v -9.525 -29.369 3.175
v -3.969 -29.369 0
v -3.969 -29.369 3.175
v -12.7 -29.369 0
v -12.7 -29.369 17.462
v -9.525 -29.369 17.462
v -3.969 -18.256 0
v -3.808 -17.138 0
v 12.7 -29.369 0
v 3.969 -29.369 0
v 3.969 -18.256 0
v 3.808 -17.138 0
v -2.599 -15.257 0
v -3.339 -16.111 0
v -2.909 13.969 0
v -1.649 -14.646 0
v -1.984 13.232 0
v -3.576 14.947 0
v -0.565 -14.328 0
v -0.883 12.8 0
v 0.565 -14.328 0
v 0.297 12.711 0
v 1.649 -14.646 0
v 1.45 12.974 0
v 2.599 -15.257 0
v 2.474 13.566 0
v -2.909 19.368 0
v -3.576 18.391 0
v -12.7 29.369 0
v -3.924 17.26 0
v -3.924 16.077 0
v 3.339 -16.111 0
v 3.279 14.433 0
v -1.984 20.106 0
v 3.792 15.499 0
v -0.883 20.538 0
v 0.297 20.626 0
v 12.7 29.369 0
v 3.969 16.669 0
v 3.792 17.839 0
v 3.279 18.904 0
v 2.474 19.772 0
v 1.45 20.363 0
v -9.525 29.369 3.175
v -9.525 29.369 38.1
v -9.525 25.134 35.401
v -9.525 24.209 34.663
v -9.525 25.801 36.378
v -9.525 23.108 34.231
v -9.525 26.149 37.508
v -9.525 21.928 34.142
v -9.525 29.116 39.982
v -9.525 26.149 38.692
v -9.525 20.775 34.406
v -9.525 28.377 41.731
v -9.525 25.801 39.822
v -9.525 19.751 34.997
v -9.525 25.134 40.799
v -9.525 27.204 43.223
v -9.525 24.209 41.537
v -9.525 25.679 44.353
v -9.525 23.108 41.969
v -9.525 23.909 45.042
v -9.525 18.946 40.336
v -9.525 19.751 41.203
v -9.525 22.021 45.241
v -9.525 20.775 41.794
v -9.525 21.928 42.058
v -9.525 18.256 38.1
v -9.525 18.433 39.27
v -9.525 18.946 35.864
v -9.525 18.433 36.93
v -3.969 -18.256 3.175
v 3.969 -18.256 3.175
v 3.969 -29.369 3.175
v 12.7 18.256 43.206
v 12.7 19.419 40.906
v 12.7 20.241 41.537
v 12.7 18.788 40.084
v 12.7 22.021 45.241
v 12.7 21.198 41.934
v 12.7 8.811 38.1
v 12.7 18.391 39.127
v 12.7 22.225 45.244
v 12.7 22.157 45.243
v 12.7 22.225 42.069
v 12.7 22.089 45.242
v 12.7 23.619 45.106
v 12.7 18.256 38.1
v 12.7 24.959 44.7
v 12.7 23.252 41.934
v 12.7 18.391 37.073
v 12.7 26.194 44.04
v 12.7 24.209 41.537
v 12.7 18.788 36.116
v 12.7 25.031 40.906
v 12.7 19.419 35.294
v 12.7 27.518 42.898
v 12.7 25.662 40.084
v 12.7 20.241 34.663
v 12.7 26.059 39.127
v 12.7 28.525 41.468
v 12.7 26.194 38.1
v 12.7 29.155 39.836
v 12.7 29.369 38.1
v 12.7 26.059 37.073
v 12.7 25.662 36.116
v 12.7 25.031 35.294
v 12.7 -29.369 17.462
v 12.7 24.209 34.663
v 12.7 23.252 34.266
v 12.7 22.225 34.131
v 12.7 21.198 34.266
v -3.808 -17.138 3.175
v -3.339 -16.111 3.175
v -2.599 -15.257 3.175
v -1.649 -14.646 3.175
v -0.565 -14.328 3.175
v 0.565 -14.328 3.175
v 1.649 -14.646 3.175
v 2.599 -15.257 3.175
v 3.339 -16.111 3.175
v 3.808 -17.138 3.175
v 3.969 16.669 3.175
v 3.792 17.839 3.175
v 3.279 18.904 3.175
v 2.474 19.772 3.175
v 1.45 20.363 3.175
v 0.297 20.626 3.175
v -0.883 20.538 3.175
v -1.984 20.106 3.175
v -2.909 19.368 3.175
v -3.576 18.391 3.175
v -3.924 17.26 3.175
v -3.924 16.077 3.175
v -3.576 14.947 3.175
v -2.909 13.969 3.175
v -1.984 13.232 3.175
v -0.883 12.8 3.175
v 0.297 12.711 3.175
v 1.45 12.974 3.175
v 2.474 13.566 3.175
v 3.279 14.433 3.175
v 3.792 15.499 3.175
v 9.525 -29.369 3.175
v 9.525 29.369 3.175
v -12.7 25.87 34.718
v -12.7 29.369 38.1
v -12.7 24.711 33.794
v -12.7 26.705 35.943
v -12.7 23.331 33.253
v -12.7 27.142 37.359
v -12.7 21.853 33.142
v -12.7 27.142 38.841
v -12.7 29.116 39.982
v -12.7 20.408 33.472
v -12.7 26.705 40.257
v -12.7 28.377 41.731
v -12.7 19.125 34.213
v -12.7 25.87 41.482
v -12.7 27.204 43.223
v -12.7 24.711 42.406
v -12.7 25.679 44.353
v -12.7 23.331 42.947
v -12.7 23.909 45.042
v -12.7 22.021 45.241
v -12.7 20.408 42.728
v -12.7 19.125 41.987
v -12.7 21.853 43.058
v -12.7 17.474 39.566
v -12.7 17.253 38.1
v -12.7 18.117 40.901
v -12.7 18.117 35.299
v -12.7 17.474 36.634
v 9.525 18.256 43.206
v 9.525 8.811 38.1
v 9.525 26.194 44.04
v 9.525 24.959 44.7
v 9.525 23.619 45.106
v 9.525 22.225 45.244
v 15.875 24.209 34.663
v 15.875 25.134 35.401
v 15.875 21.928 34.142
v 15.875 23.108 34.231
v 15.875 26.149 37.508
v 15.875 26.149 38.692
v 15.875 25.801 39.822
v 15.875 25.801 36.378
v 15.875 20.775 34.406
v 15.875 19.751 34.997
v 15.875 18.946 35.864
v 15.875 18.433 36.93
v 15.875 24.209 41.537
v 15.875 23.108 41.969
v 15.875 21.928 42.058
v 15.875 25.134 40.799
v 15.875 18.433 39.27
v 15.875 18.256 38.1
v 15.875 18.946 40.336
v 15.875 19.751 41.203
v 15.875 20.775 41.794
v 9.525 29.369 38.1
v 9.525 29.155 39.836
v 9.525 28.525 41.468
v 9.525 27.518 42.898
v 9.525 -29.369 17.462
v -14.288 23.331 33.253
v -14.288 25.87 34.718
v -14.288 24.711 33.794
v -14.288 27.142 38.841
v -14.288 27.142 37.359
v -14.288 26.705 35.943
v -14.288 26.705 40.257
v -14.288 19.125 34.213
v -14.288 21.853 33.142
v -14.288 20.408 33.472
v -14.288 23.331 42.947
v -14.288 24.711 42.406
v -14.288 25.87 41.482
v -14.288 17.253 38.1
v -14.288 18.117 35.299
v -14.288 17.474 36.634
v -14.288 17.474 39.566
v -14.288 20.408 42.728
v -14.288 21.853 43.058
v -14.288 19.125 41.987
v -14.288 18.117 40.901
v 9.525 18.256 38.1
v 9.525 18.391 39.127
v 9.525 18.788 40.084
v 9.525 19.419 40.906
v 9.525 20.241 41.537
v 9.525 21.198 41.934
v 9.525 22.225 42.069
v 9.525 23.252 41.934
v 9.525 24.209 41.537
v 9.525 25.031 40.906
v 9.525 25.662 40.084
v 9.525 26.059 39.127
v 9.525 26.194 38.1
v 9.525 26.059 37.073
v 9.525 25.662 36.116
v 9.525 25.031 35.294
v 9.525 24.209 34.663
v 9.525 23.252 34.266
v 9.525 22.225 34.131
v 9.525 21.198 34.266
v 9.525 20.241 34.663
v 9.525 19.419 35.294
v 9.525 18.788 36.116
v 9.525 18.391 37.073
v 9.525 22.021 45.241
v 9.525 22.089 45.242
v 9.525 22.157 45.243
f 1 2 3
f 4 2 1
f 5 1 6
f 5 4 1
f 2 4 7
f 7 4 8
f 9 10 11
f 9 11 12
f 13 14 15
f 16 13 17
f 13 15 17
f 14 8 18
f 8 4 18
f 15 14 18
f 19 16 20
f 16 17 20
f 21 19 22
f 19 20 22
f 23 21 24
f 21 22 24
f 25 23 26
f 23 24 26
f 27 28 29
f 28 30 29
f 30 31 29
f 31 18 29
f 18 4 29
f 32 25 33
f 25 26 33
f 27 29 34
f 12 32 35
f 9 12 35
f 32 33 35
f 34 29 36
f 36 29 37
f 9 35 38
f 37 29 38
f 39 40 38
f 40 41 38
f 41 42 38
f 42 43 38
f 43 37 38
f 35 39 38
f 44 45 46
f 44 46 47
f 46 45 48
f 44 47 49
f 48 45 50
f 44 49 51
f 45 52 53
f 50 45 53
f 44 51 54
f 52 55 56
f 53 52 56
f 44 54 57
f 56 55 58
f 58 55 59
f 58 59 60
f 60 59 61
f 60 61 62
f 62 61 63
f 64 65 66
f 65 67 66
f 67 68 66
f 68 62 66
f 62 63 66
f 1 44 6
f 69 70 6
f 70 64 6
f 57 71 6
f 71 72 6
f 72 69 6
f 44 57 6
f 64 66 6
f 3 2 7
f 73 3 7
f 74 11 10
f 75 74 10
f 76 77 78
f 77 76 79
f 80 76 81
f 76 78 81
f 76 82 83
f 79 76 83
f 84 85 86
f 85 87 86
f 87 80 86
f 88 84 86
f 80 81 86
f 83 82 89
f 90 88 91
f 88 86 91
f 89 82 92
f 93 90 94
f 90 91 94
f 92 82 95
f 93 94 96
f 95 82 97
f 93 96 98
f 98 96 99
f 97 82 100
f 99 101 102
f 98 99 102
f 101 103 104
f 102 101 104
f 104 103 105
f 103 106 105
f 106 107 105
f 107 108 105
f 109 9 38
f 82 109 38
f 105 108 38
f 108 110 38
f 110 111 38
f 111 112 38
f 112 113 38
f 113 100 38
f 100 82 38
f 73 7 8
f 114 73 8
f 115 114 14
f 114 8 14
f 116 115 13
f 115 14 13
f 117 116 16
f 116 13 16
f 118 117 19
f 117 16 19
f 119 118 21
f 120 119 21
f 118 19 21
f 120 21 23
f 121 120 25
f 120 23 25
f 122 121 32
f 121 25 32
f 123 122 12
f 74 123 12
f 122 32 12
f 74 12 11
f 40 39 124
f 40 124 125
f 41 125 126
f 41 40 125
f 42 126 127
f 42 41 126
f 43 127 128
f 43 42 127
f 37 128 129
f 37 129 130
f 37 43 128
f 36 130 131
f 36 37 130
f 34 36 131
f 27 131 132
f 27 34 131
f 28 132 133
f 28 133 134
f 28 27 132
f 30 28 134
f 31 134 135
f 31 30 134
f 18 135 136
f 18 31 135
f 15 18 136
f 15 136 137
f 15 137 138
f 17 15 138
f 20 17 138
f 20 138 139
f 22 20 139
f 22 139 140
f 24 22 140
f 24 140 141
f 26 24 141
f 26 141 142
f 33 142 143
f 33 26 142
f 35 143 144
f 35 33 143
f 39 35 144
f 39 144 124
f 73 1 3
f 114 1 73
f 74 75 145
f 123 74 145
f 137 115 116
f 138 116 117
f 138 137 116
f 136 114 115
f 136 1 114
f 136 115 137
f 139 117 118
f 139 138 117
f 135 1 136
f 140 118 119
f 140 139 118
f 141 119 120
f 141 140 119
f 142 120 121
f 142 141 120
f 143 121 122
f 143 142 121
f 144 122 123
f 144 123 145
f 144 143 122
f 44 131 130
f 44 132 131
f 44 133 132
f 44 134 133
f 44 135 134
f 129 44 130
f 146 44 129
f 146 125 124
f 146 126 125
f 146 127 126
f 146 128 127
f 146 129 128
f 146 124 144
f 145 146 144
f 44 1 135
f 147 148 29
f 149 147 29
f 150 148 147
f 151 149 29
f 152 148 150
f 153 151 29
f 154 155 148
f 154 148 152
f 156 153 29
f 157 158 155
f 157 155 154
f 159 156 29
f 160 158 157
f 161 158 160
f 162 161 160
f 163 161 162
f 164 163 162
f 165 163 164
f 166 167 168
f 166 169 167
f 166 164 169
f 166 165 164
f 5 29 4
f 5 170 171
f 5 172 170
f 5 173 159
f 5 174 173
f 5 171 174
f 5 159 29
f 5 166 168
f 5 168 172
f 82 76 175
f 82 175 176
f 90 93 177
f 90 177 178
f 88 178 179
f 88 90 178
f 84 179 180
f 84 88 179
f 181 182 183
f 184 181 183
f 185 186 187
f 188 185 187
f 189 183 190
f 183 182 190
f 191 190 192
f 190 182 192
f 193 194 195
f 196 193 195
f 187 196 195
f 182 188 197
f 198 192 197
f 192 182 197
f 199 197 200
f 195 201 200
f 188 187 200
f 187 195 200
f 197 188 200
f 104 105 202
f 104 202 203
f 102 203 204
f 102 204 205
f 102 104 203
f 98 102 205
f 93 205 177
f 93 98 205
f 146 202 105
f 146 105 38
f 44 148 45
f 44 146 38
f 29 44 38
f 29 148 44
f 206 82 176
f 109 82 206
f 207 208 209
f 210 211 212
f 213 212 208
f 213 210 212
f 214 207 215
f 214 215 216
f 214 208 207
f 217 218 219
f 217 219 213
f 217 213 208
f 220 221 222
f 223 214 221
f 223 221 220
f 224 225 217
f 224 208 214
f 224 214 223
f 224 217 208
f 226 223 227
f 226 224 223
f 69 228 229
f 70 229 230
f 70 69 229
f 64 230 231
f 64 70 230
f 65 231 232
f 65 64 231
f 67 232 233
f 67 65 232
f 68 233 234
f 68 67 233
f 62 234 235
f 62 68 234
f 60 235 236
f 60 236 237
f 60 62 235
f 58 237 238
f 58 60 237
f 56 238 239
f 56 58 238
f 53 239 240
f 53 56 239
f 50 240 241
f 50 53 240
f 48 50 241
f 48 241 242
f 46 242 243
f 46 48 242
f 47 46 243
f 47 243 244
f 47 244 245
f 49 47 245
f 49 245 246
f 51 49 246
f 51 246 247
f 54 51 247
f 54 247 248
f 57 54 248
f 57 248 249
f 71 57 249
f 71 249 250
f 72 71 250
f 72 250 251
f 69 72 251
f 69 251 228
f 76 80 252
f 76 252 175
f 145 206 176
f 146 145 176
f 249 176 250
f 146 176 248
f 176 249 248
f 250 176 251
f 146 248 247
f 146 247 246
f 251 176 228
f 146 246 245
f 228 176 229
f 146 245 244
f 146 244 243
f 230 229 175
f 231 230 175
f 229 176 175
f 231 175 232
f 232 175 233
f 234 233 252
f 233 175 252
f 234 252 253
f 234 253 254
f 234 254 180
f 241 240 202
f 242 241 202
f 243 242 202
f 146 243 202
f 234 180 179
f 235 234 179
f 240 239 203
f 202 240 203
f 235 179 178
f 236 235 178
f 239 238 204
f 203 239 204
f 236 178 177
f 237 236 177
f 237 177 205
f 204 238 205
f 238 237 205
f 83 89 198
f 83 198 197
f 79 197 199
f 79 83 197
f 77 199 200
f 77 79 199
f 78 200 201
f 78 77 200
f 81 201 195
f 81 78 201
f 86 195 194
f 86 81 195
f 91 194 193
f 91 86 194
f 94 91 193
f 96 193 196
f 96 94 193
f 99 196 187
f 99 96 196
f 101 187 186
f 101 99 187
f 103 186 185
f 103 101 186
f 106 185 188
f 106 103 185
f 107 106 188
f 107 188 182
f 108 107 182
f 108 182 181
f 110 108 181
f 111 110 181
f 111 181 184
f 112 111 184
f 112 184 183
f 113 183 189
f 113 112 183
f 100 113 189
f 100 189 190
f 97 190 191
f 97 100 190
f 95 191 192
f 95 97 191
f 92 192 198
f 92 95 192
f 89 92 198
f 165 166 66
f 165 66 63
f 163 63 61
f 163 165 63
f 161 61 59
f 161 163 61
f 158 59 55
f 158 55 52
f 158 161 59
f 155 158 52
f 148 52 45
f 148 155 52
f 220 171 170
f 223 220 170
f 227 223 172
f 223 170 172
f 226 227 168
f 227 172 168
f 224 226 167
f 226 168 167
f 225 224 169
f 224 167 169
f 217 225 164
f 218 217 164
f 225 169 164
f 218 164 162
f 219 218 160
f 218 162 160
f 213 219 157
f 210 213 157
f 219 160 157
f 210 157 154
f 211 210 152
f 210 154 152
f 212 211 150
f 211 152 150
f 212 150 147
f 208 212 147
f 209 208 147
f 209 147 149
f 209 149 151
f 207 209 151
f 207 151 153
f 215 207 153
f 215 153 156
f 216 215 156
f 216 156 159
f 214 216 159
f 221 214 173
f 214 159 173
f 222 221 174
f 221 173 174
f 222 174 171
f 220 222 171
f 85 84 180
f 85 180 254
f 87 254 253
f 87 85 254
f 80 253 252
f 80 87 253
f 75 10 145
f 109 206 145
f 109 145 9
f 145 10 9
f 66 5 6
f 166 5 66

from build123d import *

# Parameters (mm, degrees)
F0_R     = 3.96875
F1_DEPTH = 3.175
F2_R     = 4.9721039952
F2_W     = 58.7375
F2_H     = 14.2875
F2_H_2   = 3.175
F2_R_2   = 3.96875
F3_DEPTH = 3.175
F4_W     = 3.175
F4_H     = 20.6375
F4_W_2   = 3.96875
F4_H_2   = 14.2875
F4_H_3   = 3.175
F4_W_3   = 47.625
F5_DEPTH = 3.175
F6_DEPTH = 28.575
F7_DEPTH = 1.5875


with BuildPart() as f1:
    # F0 (on Top) → F1 (new body)
    with BuildSketch(Plane.XY):
        with BuildLine():
            Line((12.7, 29.36875), (-12.7, 29.36875))
            Line((-12.7, 29.36875), (-12.7, -29.36875))
            Line((-12.7, -29.36875), (-3.96875, -29.36875))
            Line((-3.96875, -29.36875), (-3.96875, -18.25625))
            ThreePointArc((-3.96875, -18.25625), (0, -14.2875), (3.96875, -18.25625))
            Line((3.96875, -18.25625), (3.96875, -29.36875))
            Line((3.96875, -29.36875), (12.7, -29.36875))
            Line((12.7, -29.36875), (12.7, 29.36875))
        make_face()
        with Locations((0, 16.66875)):
            Circle(F0_R, mode=Mode.SUBTRACT)
    extrude(amount=F1_DEPTH)

    # F2 (on face) → F3 (join)
    with BuildSketch(Plane(origin=(-12.7, 0, 0), x_dir=(0, -1, 0), z_dir=(-1, 0, 0))):
        with BuildLine():
            Line((-29.36875, 38.1), (-29.36875, 17.4625))
            Line((-29.36875, 17.4625), (29.36875, 17.4625))
            Line((29.36875, 17.4625), (-22.0211824404, 45.2408418597))
            ThreePointArc((-22.0211824404, 45.2408418597), (-27.2038122264, 43.2229476746), (-29.36875, 38.1))
        make_face()
        with Locations((-22.225, 38.1)):
            Circle(F2_R, mode=Mode.SUBTRACT)
        with Locations((0, 10.31875)):
            Rectangle(F2_W, F2_H)
        with Locations((0, 1.5875)):
            Rectangle(F2_W, F2_H_2)
        with Locations((-22.225, 38.1)):
            Circle(F2_R)
        with Locations((-22.225, 38.1)):
            Circle(F2_R_2, mode=Mode.SUBTRACT)
    extrude(amount=-F3_DEPTH)

    # F4 (on face) → F5 (join)
    with BuildSketch(Plane.YZ.offset(12.7)):
        Polygon((-29.36875, 17.4625), (18.25625, 17.4625), (18.25625, 38.1), (8.810625, 38.1), align=None)
        Polygon((8.810625, 38.1), (18.25625, 38.1), (18.25625, 43.2057432432), align=None)
        with BuildLine():
            ThreePointArc((18.25625, 38.1), (19.4186699622, 40.9063300378), (22.225, 42.06875))
            Line((22.225, 42.06875), (22.225, 45.24375))
            ThreePointArc((22.225, 45.24375), (22.1230808471, 45.2430229279), (22.0211824404, 45.2408418597))
            Line((22.0211824404, 45.2408418597), (18.25625, 43.2057432432))
            Line((18.25625, 43.2057432432), (18.25625, 38.1))
        make_face()
        with BuildLine():
            ThreePointArc((22.225, 42.06875), (25.0313300378, 40.9063300378), (26.19375, 38.1))
            Line((26.19375, 38.1), (26.19375, 44.0398811015))
            ThreePointArc((26.19375, 44.0398811015), (24.2986608261, 44.9361608261), (22.225, 45.24375))
            Line((22.225, 45.24375), (22.225, 42.06875))
        make_face()
        with BuildLine():
            Line((26.19375, 38.1), (29.36875, 38.1))
            ThreePointArc((29.36875, 38.1), (28.5251953095, 41.4675960454), (26.19375, 44.0398811015))
            Line((26.19375, 44.0398811015), (26.19375, 38.1))
        make_face()
        with Locations((27.78125, 27.78125)):
            Rectangle(F4_W, F4_H)
        with BuildLine():
            Line((22.225, 17.4625), (26.19375, 17.4625))
            Line((26.19375, 17.4625), (26.19375, 38.1))
            ThreePointArc((26.19375, 38.1), (25.0313300378, 35.2936699622), (22.225, 34.13125))
            Line((22.225, 34.13125), (22.225, 17.4625))
        make_face()
        with BuildLine():
            Line((18.25625, 17.4625), (22.225, 17.4625))
            Line((22.225, 17.4625), (22.225, 34.13125))
            ThreePointArc((22.225, 34.13125), (19.4186699622, 35.2936699622), (18.25625, 38.1))
            Line((18.25625, 38.1), (18.25625, 17.4625))
        make_face()
        with Locations((20.240625, 10.31875)):
            Rectangle(F4_W_2, F4_H_2)
        with Locations((24.209375, 10.31875)):
            Rectangle(F4_W_2, F4_H_2)
        with Locations((27.78125, 10.31875)):
            Rectangle(F4_W, F4_H_2)
        with Locations((27.78125, 1.5875)):
            Rectangle(F4_W, F4_H_3)
        with Locations((24.209375, 1.5875)):
            Rectangle(F4_W_2, F4_H_3)
        with Locations((20.240625, 1.5875)):
            Rectangle(F4_W_2, F4_H_3)
        with Locations((-5.55625, 1.5875)):
            Rectangle(F4_W_3, F4_H_3)
        with Locations((-5.55625, 10.31875)):
            Rectangle(F4_W_3, F4_H_2)
    extrude(amount=-F5_DEPTH)

    # F2 (on face) → F6 (join)
    with BuildSketch(Plane(origin=(-12.7, 0, 0), x_dir=(0, -1, 0), z_dir=(-1, 0, 0))):
        with Locations((-22.225, 38.1)):
            Circle(F2_R_2)
    extrude(amount=-F6_DEPTH)

    # F2 (on face) → F7 (join)
    with BuildSketch(Plane(origin=(-12.7, 0, 0), x_dir=(0, -1, 0), z_dir=(-1, 0, 0))):
        with Locations((-22.225, 38.1)):
            Circle(F2_R)
        with Locations((-22.225, 38.1)):
            Circle(F2_R_2, mode=Mode.SUBTRACT)
        with Locations((-22.225, 38.1)):
            Circle(F2_R_2)
    extrude(amount=F7_DEPTH)


solid = f1.part
